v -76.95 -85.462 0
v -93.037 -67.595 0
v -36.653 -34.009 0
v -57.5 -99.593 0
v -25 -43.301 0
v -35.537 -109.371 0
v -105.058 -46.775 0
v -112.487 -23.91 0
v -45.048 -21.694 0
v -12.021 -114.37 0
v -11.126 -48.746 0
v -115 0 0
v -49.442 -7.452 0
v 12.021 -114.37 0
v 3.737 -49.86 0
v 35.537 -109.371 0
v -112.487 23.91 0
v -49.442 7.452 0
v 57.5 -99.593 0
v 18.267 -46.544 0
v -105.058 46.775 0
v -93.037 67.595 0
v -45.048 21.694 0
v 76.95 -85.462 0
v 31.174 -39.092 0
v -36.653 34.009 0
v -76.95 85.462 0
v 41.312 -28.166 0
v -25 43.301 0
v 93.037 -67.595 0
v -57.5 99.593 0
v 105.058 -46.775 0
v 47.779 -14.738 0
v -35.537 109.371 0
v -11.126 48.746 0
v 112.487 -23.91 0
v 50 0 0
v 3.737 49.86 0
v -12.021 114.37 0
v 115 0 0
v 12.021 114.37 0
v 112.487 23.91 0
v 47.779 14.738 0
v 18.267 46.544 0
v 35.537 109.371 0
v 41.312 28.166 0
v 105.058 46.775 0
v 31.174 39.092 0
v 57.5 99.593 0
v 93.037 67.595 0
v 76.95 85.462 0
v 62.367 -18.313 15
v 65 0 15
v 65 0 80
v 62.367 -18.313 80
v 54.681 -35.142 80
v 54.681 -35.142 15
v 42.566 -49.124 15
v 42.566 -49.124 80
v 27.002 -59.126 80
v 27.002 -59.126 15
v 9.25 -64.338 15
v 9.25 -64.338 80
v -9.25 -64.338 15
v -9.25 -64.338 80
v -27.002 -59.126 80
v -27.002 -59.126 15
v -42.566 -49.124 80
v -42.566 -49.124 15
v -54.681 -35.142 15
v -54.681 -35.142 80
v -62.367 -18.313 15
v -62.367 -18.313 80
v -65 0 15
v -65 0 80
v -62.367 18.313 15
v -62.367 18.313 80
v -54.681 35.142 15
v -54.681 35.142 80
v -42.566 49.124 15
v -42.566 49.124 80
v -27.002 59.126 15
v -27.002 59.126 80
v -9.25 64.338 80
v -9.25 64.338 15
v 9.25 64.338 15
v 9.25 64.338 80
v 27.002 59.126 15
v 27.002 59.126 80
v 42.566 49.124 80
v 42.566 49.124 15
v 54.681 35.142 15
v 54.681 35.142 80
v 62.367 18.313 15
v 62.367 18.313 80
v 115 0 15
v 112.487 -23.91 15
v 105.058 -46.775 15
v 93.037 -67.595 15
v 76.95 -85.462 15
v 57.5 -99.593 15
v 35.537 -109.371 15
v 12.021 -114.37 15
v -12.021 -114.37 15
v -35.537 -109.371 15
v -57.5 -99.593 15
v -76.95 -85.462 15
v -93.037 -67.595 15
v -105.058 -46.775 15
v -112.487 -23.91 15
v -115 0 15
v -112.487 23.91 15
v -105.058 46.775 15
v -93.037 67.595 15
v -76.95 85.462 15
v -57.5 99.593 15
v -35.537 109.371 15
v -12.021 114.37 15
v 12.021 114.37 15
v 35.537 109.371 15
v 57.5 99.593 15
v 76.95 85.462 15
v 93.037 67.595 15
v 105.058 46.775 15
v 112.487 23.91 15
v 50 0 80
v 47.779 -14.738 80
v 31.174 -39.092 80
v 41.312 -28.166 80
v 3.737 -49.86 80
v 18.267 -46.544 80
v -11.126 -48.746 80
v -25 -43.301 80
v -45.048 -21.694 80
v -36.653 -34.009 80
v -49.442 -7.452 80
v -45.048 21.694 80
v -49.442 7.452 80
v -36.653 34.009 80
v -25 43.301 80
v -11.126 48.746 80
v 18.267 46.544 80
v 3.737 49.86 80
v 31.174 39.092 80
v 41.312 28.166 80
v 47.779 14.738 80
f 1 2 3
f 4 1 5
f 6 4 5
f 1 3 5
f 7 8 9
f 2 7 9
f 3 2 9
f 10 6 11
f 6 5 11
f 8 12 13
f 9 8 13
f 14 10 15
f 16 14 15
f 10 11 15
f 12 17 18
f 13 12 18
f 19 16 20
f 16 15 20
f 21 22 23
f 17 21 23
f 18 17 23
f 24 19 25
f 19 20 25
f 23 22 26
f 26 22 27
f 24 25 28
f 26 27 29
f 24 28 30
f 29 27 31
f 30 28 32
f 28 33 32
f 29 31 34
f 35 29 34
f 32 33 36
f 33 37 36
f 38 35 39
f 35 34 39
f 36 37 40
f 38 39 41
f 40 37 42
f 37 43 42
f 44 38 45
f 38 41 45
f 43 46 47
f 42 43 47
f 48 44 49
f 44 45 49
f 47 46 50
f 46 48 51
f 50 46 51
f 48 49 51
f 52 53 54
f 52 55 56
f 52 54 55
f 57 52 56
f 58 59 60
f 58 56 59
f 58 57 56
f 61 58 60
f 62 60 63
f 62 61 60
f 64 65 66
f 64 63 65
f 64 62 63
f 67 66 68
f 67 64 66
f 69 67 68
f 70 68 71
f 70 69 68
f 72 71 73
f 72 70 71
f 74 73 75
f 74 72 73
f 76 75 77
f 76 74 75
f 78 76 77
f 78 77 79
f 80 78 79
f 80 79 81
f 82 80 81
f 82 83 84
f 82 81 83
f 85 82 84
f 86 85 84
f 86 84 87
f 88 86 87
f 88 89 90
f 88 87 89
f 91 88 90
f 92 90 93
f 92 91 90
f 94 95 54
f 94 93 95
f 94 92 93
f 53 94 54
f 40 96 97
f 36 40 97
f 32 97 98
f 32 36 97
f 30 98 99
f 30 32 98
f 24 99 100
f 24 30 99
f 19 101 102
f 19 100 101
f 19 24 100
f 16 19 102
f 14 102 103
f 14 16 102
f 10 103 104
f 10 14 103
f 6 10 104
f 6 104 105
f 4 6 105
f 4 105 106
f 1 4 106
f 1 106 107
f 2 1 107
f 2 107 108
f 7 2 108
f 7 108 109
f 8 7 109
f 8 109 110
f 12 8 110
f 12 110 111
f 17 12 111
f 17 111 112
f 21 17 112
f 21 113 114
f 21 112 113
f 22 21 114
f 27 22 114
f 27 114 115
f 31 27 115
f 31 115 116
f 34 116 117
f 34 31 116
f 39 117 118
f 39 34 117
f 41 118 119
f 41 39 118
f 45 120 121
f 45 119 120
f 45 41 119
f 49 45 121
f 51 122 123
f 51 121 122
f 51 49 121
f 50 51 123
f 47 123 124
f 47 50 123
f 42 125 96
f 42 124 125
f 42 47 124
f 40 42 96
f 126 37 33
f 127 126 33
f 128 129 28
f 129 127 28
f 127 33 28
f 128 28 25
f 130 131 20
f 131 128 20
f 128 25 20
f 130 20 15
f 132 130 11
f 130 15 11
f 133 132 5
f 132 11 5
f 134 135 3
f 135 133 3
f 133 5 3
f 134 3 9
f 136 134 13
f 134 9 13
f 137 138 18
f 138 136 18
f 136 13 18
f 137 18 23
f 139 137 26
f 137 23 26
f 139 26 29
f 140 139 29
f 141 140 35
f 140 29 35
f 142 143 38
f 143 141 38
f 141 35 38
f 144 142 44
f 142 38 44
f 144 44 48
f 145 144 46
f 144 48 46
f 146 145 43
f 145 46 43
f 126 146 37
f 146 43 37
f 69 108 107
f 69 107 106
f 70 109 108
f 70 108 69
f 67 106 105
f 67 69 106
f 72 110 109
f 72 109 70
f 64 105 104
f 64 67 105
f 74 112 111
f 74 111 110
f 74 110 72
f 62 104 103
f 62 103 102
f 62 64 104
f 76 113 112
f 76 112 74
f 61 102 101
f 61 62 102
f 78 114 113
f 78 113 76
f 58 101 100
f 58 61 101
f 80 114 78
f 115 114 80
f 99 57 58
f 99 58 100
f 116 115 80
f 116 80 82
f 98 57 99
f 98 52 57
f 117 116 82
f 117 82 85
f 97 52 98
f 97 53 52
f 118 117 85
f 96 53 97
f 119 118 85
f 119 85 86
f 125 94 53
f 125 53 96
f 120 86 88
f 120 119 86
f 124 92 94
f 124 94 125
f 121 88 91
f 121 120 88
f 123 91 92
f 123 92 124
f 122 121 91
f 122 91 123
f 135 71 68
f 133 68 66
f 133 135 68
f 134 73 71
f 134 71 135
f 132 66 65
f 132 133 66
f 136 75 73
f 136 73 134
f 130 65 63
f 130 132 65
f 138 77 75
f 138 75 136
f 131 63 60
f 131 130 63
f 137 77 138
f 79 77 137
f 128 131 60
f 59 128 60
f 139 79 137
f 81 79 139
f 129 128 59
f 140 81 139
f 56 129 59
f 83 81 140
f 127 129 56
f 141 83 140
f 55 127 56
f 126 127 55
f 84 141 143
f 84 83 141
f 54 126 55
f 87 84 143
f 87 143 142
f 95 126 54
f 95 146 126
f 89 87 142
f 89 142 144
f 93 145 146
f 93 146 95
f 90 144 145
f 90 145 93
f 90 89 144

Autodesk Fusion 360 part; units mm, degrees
sketch "Sketch1" plane through (0, 0, 0) normal (0, 0, 1) x (1, 0, 0)
  circle A0 centre (0, 0) radius 115
  circle A1 centre (0, 0) radius 87.5 construction
  circle A2 centre (0, 0) radius 65
  circle A3 centre (0, 0) radius 50
  dimension "d1" = 230
  dimension "d2" = 175
  dimension "d3" = 130
  dimension "d4" = 100
extrude "Extrude1" add sketch "Sketch1" along normal blind 15 contours A0
extrude "Extrude2" add sketch "Sketch1" along normal blind 80 contours A2
sketch "Sketch2" plane through (0, 0, 15) normal (0, 0, 1) x (-1, 0, 0)
  circle A0 centre (0, 0) radius 65
  circle A1 centre (0, 0) radius 115
  circle A2 centre (0, 0) radius 87.5
  line L0 (0, 0) -> (0, -122.0079) construction
  line L1 (0, 0) -> (50.2765, -121.3782) construction
  circle A3 centre (33.4848, -80.8395) radius 7.5
  dimension "d11" = 22.5
  dimension "d12" = 15
extrude "Extrude3" cut sketch "Sketch2" along normal through all contours A2 A3 | A2 A3 picked at (32.6894, -78.4443) picked at (34.4384, -83.1246)
pattern_circular "C-Pattern1" count 8 over 360 about axis through (0, 0, 0) along (0, 0, 1) of "Extrude3"
